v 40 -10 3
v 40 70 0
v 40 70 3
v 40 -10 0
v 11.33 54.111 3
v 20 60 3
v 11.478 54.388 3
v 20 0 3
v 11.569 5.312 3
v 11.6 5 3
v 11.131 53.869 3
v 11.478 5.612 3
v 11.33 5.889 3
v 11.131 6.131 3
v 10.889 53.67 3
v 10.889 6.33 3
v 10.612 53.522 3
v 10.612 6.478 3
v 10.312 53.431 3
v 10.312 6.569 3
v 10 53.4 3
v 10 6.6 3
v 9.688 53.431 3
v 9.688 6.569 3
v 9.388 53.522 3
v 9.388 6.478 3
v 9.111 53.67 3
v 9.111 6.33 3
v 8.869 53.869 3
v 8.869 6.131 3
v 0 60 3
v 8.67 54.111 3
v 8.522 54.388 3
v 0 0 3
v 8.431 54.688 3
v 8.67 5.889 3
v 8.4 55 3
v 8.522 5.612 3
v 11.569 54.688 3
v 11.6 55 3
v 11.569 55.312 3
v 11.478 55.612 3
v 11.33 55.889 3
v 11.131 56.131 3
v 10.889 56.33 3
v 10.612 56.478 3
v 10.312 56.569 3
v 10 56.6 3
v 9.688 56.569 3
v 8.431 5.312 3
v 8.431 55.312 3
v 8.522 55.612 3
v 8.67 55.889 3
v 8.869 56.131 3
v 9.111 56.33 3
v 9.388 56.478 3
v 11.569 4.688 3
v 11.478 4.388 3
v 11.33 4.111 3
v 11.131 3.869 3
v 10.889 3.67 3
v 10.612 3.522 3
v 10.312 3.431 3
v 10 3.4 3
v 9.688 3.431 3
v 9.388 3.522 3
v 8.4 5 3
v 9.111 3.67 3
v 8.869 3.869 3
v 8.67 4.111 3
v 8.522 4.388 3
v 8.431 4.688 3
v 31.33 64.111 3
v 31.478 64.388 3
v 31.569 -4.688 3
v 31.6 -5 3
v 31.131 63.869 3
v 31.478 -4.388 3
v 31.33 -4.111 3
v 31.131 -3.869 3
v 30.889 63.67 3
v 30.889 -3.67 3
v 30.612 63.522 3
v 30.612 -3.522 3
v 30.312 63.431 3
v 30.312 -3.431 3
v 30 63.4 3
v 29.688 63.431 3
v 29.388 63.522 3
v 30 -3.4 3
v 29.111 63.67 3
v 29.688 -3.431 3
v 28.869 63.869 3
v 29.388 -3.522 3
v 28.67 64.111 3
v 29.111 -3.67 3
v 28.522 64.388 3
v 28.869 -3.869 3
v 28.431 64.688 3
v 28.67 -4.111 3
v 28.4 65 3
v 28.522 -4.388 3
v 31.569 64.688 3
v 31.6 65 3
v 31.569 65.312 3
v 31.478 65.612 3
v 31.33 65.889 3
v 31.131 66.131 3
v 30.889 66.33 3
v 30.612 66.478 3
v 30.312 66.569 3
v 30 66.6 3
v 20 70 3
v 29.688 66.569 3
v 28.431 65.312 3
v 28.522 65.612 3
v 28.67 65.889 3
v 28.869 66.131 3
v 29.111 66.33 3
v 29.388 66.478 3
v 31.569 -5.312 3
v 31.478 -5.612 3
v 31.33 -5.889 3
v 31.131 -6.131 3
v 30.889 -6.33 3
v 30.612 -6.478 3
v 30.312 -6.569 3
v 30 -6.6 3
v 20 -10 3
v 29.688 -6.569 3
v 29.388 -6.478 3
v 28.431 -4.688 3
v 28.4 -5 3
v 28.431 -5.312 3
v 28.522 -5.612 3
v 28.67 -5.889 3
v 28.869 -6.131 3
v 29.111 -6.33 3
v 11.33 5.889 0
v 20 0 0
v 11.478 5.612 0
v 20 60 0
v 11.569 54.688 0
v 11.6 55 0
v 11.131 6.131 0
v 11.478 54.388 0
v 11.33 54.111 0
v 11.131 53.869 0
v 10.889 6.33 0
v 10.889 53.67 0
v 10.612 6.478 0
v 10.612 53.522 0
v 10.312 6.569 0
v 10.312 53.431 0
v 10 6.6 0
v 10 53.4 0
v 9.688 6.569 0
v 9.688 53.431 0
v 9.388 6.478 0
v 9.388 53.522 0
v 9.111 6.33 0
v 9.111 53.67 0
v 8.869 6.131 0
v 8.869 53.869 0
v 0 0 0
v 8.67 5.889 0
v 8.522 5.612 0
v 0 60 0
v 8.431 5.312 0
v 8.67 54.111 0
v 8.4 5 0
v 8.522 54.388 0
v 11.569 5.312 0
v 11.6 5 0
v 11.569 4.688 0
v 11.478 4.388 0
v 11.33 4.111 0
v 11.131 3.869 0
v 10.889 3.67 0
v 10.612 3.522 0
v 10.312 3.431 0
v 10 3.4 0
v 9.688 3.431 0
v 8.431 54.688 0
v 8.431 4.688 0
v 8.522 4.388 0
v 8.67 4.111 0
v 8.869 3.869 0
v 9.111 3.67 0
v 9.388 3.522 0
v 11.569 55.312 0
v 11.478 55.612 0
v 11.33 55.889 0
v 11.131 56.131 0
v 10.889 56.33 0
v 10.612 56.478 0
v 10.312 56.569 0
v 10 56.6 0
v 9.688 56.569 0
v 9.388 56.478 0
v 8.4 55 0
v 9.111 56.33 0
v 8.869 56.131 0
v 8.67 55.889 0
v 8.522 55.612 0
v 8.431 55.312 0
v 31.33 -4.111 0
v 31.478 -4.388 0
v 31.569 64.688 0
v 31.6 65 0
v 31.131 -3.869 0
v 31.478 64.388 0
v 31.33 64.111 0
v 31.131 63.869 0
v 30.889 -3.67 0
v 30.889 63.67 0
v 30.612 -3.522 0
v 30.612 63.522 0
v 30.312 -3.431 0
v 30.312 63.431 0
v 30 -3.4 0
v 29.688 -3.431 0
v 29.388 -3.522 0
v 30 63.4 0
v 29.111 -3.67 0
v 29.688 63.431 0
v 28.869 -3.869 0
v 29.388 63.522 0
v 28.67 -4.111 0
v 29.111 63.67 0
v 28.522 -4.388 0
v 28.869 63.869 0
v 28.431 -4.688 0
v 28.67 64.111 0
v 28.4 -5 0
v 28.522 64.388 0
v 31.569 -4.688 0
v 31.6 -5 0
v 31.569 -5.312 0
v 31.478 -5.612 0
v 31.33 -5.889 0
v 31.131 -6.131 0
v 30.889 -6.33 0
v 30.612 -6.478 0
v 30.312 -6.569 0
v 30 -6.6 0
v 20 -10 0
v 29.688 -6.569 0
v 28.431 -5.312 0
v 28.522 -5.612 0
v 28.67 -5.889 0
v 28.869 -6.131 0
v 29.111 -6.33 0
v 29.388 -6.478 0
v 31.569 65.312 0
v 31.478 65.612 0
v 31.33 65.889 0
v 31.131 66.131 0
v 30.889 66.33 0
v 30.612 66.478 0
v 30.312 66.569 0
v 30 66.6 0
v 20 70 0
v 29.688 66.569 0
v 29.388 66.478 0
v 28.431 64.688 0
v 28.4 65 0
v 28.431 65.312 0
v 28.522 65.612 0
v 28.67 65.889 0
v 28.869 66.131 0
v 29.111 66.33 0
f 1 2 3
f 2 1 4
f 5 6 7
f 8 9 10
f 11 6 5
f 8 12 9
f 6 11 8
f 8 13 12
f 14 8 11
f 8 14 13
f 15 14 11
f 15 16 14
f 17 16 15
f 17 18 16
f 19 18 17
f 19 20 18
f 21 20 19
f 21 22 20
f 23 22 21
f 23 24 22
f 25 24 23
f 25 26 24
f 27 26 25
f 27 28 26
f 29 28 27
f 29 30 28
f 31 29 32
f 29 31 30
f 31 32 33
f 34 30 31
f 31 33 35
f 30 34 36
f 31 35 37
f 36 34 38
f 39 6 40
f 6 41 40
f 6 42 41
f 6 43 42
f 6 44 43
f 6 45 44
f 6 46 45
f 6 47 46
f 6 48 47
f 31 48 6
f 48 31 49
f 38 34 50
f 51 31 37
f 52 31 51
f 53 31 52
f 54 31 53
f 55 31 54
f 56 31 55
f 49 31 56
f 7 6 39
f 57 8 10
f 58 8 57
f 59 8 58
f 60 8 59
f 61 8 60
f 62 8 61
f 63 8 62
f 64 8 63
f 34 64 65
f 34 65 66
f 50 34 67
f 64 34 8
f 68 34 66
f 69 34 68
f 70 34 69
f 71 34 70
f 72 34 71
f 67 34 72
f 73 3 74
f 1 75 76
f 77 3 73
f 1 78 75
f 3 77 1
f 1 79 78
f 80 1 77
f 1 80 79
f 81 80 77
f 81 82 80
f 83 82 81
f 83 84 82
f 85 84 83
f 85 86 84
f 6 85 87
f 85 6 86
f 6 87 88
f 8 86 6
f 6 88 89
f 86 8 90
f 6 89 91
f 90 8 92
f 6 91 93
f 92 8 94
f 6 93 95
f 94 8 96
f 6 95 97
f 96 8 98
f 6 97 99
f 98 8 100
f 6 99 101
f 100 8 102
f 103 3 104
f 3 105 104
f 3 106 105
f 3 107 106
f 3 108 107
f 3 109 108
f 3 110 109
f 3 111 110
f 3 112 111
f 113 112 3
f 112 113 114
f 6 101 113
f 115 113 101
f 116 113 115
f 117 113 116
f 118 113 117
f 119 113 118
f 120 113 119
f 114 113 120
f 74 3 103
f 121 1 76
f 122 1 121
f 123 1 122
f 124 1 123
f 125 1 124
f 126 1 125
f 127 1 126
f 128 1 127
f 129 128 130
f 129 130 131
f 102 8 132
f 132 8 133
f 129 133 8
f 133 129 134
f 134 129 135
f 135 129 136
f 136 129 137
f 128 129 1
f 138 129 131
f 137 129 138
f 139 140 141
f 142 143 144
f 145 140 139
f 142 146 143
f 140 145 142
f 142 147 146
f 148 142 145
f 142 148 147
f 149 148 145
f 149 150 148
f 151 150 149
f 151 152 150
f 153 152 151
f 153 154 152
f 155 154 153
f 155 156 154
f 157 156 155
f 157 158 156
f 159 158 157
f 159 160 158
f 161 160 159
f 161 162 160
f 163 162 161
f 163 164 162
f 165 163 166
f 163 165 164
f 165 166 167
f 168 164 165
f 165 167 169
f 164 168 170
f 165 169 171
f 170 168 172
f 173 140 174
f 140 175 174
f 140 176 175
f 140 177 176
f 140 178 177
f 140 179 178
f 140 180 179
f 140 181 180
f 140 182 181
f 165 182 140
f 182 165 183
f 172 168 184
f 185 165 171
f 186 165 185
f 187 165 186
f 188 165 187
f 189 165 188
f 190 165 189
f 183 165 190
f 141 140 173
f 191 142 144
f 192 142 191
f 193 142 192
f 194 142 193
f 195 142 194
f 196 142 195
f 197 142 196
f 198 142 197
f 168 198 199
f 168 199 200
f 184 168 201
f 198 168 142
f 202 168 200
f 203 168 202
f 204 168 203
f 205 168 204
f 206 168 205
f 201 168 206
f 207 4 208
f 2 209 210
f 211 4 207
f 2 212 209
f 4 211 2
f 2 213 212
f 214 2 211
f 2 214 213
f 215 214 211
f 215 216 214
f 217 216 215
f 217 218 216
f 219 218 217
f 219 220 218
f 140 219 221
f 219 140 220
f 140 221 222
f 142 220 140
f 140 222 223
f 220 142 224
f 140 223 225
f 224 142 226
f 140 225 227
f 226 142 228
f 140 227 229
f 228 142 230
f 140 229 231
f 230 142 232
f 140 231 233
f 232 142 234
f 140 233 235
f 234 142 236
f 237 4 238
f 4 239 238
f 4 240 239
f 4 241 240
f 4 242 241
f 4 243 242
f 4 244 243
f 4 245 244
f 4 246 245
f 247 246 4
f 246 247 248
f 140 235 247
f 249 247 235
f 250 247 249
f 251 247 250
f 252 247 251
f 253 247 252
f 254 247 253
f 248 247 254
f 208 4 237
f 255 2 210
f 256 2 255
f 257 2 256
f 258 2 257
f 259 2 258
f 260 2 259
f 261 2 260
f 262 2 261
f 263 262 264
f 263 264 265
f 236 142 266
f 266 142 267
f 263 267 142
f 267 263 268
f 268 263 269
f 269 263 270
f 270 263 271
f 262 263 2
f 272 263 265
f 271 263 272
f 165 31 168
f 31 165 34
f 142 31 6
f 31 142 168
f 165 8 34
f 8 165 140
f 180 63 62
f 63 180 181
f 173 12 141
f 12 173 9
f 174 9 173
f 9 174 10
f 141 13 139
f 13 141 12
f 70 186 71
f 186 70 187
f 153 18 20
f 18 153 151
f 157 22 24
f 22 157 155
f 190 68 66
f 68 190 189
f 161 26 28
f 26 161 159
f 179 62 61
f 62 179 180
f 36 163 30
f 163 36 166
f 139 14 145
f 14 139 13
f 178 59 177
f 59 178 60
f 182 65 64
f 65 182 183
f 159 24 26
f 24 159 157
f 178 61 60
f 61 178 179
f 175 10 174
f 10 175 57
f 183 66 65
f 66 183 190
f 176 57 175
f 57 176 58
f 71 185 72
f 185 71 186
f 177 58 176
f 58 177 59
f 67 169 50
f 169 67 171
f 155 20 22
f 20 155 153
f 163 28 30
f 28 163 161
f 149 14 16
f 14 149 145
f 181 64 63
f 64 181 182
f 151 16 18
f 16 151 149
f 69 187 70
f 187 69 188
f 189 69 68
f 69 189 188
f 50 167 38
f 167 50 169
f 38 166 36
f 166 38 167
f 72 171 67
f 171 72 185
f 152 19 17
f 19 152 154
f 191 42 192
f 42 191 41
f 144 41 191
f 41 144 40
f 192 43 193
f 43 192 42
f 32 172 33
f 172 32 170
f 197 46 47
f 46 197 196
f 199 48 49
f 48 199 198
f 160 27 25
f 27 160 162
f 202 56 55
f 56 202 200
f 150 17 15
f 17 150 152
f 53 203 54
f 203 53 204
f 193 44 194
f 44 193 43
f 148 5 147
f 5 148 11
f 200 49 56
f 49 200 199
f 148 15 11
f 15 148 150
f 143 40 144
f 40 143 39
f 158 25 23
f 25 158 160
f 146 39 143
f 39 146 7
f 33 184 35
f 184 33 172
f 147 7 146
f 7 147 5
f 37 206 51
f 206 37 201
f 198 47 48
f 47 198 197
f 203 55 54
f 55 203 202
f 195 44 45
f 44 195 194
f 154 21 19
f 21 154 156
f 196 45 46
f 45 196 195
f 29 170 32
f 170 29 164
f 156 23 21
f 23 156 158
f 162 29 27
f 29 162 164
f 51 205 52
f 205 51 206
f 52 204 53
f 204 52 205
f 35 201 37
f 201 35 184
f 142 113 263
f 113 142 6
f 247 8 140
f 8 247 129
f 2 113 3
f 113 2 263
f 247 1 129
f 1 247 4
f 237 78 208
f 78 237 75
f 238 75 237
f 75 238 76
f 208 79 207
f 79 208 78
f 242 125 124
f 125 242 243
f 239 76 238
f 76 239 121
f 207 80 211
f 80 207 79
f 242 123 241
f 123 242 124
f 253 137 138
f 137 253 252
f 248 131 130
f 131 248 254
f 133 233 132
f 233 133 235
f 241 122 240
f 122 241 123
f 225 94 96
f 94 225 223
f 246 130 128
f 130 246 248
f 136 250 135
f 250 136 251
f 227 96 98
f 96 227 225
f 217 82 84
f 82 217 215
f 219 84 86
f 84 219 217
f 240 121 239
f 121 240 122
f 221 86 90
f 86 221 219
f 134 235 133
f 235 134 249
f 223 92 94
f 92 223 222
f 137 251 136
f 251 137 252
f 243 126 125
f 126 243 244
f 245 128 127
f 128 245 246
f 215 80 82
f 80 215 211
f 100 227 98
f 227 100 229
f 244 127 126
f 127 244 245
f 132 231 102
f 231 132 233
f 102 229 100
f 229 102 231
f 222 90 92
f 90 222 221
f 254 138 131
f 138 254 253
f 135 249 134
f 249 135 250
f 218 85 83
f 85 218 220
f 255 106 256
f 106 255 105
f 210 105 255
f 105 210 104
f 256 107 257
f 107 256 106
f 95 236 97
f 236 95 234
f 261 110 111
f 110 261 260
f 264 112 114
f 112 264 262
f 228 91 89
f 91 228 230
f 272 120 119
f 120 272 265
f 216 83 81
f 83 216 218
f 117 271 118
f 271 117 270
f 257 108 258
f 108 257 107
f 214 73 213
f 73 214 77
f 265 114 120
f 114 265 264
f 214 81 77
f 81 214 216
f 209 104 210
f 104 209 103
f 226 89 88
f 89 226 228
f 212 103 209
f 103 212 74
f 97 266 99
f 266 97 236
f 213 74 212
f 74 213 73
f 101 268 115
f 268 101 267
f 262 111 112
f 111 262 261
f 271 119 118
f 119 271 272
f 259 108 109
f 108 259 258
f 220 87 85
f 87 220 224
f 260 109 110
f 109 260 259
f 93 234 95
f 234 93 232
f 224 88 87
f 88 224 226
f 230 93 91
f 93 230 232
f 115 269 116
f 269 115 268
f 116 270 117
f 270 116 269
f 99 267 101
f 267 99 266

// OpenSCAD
// Different parts for a paper tape punch designed in OpenScad. 
// Name: Servo_holder.scad
// Lars Silen 2024
// This is free software. Feel fre to use or modify. 
// 
// Different parts are written as modules that are called by
// uncommenting the part to be viewed or printed. 
// The different block_xxx() modules print servo towers of different
// heights. For the present version only block_four() and block_five()
// are needed to hold. The module riser() lifts the servo tower to a 
// suitable height over the punch block. The module fix220() is used to
// fix the mains supply cable to the building plate. 
// The saw_support() parts are used when the punch head is drilled to
// unsure we aren't breaking the glue bonds between the punch body and the
// brass inlays. Check which one gives the best support for drilling. The
// support is removed after the punch holes are drilled. 
// The sharpener() is a tool that can be attached to a dremel type drill. 
// The when a round ca. 3 mm diameter diamond file is attached to the Dremel
// it is faily easy to create a reasonable cutting end on the drill to be used
// as a punch. 
// The paper_movement() part helds the wheel pressing the paper tape towards
// the paper movement cylinder. There are several holes for an axle allowing
// longitudinal adjustments. The movement_base() connects to the plywood base
// and holds the paper movement:part(). 
// The block_riser3() increases the height of the servo towers over the 
// punch block. These parts can be glued using super glue to the bottom off
// the servo towers providing extra fastenings. 
// 
//block_one();
//block_two();
//block_three();
//block_four();
//block_five();
//block_nine();
//translate([-(60-34.5)/2,0,0])fastening();
//riser();
//fix_220();
//saw_support();
//punch_holder();
//sharpener();
//paper_movement();
//translate([0,-70,0])movement_base();
//block_riser_3();

module servo_holder(height){
  difference(){
    cube([24.5+10,13+2*1.5,18+height]);
    translate([5-0.1,1.5,-0.01])cube([24.7,13,18+height+0.1]);
    translate([2.5,((13+2*1.5)/2),-0.01])cylinder(r=1.4,h=18+height+0.1,$fn=32);
    translate([(24.5+10)-2.5,((13+2*1.5)/2),-0.01])cylinder(r=1.4,h=18+height+0.1,$fn=32);
    // Cut out for servo vires etc.  
    //translate([-0.01,1.5,1.5])cube([5.1,13,10+height]);
    translate([-0.01,1.5,2])cube([5.1,13,9.5+height]);  
    //translate([-0.01+(23.5+10)-5,1.5,1.5])cube([5.1,13,10+height]); 
    translate([-0.01+(23.5+11)-5,1.5,2])cube([5.1,13,9.5+height]);  
  }  
}

module block_five(){
  servo_holder(0);  
  translate([0,13+2*1.5,0])servo_holder(2.5);
  translate([0,2*(13+2*1.5),0])servo_holder(2*2.5);
  translate([0,3*(13+2*1.5),0])servo_holder(3*2.5);
  translate([0,4*(13+2*1.5),0])servo_holder(4*2.5);  
}    

module block_four(){
  servo_holder(0);  
  translate([0,13+2*1.5,0])servo_holder(2.5);
  translate([0,2*(13+2*1.5),0])servo_holder(2*2.5);
  translate([0,3*(13+2*1.5),0])servo_holder(3*2.5);
  //translate([0,4*(12+2*1.5),0])servo_holder(4*5);  
}

module block_nine(){
  servo_holder(0);  
  translate([0,13+2*1.5,0])servo_holder(5);
  translate([0,2*(13+2*1.5),0])servo_holder(2*5);
  translate([0,3*(13+2*1.5),0])servo_holder(3*5);
  translate([0,4*(13+2*1.5),0])servo_holder(4*5);
  translate([0,5*(13+2*1.5),0])servo_holder(5*5);
  translate([0,6*(13+2*1.5),0])servo_holder(6*5);
  translate([0,7*(13+2*1.5),0])servo_holder(7*5);
  translate([0,8*(13+2*1.5),0])servo_holder(8*5); 
  translate([-(50-(23.5+10))/2,0,0])fastening();   
}

module fastening(){
  difference(){  
    cube([60,1.5,18]);
    translate([5,-0.01,8])rotate([-90,0,0])cylinder(r=1.6,h=30,$fn=32);
    translate([60-5,-0.01,8])rotate([-90,0,0])cylinder(r=1.6,h=30,$fn=32);  
  }  
}

module block_one(){
  servo_holder(0);
  translate([-(60-(23.5+10))/2,0,0])fastening(); 
}

module block_two(){
  servo_holder(0);
  translate([0,13+2*1.5,0])servo_holder(5);
  translate([-(60-(23.5+10))/2,0,0])fastening();  
}

module riser(){
  difference(){  
    cube([60,40,2]);
    translate([60-5,40-10,-1])cylinder(r=1.7,h=70,$fn=32);
    translate([60-55,40-10,-1])cylinder(r=1.7,h=70,$fn=32);  
  }
  difference(){
    cube([60,20,50]);
    // Fastening holes  
    translate([60-5,10,-1])cylinder(r=2.3,h=70,$fn=32);
    translate([60-55,10,-1])cylinder(r=2.3,h=70,$fn=32);  
  }  
}

module fix_220(){
  difference(){
    cube([50,20,10]);
    translate([-1,4,0])cube([23,5,8]);
    translate([50-23+1,4,0])cube([23,5,8]);
    translate([15,8,0])cube([20,5,8]);
    translate([8,20-5,2.1])cylinder(r=4,h=10,$fn=32);
    translate([8,20-5,-1
      ])cylinder(r=2,h=10,$fn=32);  
  }    
}    

module saw_support(){
  cube([40,9,1]);
  translate([0,15,0])cube([40,9,1.2]);  
}

module punch_holder(){
  difference(){
    cube([5,5,2]);
    translate([2-0.5,-0.01,-0.01])cube([2.1,1.5,5]);
    translate([2-0.5,5-1.5,-0.01])cube([2.1,1.6,5]);  
  }  
}

module sharpener(){
  difference(){
    cube([50,30,40]);
    translate([-0.01,-0.01,4])cube([30,31,25]);
    translate([15,15,-1])cylinder(r=17/2,h=15,$fn=32);
    translate([-0.01,-0.01,15])cube([17,31,50]);
    translate([15,15,15])cylinder(r=3,h=50,$fn=32);
    translate([0,15,20])rotate([0,90,0])cylinder(r=1,h=60,$fn=32);
    translate([0,15,25])rotate([0,90,0])cylinder(r=1,h=60,$fn=32);
    translate([0,15,32])rotate([0,90,0])cylinder(r=1,h=60,$fn=32);
    translate([0,15,37])rotate([0,90,0])cylinder(r=1,h=60,$fn=32);  
  }
}

module paper_movement(){
  difference(){
    //cube([150,30,10]);
    cube([120,30,10]);  
    translate([-0.01,5,-0.01])cube([30,20,15]);
    translate([5,-1,5])rotate([-90,0,0])cylinder(r=3.1,h=50,$fn=32);
    translate([150-5,-1,5])rotate([-90,0,0])cylinder(r=3.1,h=50,$fn=32);
    translate([150-15,-1,5])rotate([-90,0,0])cylinder(r=3.1,h=50,$fn=32);
    translate([150-25,-1,5])rotate([-90,0,0])cylinder(r=3.1,h=50,$fn=32);
    translate([150-35,-1,5])rotate([-90,0,0])cylinder(r=3.1,h=50,$fn=32);
    translate([150-45,-1,5])rotate([-90,0,0])cylinder(r=3.1,h=50,$fn=32);
    translate([150-55,-1,5])rotate([-90,0,0])cylinder(r=3.1,h=50,$fn=32);
    translate([150-65,-1,5])rotate([-90,0,0])cylinder(r=3.1,h=50,$fn=32);
    translate([150-75,-1,5])rotate([-90,0,0])cylinder(r=3.1,h=50,$fn=32);
    translate([150-85,-1,5])rotate([-90,0,0])cylinder(r=3.1,h=50,$fn=32);  
  }  
}

module movement_base(){
  difference(){
    cube([70,50,10]);
    translate([-0.01,8.5,-0.01])cube([20,33,15]);
    translate([5,-1,5])rotate([-90,0,0])cylinder(r=3.15,h=60,$fn=32);
    translate([40,12,-0.01])cube([20,26,15]);  
  } 
  difference(){
    translate([70,-10,0])cube([5,70,20]);
    //translate([0,-5,15])rotate([0,90,0])cylinder(r=1.6,h=100,$fn=32);
    translate([0,5+50,15])rotate([0,90,0])cylinder(r=1.6,h=100,$fn=32);
    translate([0,-5,10])cube([100,3,8]);   
  } 
}

module block_riser_3(){
  difference(){  
    cube([40,60,3]);
    translate([10,5,-1])cylinder(r=1.6,h=5,$fn=32);
    translate([10,60-5,-1])cylinder(r=1.6,h=5,$fn=32);  
  }
  difference(){
    translate([40-20,-10,0])cube([20,80,3]);
    translate([40-20+10,5-10,-1])cylinder(r=1.6,h=5,$fn=32);
    translate([40-20+10,70-5,-1])cylinder(r=1.6,h=5,$fn=32);  
  }  
}


//block_one();
//block_two();
//block_three();
//block_four();
//block_five();
//block_nine();
//translate([-(60-34.5)/2,0,0])fastening();
//riser();
//fix_220();
//saw_support();
//punch_holder();
//sharpener();
//paper_movement();
//translate([0,-70,0])movement_base();
block_riser_3();
